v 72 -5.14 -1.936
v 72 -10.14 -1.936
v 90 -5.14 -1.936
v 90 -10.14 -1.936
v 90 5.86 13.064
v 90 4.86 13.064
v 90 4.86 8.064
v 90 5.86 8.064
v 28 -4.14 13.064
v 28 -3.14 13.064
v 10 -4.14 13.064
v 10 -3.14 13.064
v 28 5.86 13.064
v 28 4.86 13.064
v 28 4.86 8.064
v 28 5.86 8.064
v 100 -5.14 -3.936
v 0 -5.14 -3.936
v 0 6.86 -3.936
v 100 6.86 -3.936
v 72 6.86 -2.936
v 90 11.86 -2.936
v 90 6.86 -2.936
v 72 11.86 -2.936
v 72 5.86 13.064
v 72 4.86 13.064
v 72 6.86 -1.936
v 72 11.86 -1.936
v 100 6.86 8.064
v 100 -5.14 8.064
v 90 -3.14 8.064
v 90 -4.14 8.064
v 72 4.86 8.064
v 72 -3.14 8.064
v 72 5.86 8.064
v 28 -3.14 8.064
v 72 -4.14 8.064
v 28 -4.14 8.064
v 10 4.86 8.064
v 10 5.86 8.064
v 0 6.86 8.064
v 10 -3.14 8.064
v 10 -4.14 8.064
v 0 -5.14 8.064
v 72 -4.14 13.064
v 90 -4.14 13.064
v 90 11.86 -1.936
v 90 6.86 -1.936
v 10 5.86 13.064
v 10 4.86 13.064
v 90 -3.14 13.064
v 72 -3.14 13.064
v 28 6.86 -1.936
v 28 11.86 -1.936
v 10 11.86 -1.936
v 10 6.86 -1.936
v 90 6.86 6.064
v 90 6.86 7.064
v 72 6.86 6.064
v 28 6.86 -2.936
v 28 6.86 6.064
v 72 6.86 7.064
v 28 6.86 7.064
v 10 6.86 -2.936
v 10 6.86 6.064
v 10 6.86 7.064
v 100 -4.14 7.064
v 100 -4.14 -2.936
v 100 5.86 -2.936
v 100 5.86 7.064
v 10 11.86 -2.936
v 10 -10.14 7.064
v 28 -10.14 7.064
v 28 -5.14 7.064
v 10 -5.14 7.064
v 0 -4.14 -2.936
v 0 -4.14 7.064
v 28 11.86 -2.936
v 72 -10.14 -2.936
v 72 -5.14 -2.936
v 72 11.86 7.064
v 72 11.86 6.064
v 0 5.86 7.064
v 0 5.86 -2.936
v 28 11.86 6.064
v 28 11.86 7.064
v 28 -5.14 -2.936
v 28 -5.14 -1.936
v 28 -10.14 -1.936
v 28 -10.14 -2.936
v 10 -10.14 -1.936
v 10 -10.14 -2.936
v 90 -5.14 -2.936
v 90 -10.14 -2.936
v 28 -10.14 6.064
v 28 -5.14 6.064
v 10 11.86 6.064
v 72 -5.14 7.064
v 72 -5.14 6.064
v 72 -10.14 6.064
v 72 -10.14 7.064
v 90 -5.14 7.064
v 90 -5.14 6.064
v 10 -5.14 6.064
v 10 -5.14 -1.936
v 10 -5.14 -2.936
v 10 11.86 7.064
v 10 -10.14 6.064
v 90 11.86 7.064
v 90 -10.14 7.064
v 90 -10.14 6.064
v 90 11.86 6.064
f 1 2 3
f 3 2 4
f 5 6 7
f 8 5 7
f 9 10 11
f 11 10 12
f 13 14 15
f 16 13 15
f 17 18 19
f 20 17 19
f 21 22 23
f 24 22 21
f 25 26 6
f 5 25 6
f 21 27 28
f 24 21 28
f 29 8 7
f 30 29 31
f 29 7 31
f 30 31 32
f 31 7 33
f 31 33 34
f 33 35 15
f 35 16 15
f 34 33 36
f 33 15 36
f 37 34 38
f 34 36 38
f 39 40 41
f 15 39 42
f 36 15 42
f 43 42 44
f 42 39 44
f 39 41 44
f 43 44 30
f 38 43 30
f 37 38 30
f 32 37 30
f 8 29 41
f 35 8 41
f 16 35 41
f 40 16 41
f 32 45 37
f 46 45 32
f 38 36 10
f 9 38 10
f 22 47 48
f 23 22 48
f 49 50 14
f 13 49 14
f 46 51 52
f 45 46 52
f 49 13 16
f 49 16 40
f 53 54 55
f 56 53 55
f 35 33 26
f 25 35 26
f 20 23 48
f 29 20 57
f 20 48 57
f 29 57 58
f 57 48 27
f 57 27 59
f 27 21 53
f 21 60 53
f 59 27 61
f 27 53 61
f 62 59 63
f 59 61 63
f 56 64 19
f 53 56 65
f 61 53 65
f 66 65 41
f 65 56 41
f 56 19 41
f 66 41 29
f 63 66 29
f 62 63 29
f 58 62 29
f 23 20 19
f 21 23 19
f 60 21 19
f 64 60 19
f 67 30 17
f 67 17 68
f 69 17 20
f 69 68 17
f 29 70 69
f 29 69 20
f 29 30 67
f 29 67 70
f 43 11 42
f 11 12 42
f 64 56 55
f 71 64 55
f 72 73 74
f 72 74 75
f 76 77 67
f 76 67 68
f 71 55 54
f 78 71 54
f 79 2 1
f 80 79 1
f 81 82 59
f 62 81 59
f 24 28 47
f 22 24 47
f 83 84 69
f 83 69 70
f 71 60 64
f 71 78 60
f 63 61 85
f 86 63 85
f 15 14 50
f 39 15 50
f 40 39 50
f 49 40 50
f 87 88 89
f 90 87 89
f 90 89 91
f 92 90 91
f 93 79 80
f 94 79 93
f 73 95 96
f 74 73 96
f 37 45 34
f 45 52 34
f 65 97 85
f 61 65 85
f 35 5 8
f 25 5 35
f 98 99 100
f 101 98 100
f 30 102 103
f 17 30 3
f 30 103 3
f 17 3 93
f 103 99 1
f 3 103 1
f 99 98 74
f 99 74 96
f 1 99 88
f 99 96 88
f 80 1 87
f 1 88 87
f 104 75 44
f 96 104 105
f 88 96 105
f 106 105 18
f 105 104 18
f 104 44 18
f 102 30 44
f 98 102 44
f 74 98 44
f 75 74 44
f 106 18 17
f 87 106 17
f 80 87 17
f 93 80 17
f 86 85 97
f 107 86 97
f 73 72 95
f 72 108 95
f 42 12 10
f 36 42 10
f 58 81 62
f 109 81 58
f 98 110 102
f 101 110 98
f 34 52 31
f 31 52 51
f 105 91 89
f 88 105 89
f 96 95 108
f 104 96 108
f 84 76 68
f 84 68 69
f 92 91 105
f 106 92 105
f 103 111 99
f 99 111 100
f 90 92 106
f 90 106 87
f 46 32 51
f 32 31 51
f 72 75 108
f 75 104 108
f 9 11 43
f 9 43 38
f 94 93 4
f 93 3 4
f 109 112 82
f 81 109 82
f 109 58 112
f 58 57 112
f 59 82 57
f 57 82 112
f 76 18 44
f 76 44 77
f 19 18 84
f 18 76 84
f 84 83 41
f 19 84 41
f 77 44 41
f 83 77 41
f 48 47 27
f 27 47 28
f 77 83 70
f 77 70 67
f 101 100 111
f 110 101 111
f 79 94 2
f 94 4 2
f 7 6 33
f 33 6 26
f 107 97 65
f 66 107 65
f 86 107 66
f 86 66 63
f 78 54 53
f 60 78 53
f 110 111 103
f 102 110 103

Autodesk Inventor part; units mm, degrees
ref_plane "YZ Plane" through (0, 0, 0) normal (1, 0, 0) x (0, 1, 0)
ref_plane "XZ Plane" through (0, 0, 0) normal (0, 1, 0) x (-1, 0, 0)
sketch "Sketch1" plane through (0, 0, 0) normal (1, 0, 0) x (0, 1, 0)
  line L0 (5.8599, 7.0637) -> (-4.1401, 7.0637)
  line L1 (-4.1401, 7.0637) -> (-4.1401, -2.9363)
  line L2 (-4.1401, -2.9363) -> (5.8599, -2.9363)
  line L3 (5.8599, -2.9363) -> (5.8599, 7.0637)
  line L4 (6.8599, 8.0637) -> (-5.1401, 8.0637)
  line L5 (-5.1401, 8.0637) -> (-5.1401, -3.9363)
  line L6 (-5.1401, -3.9363) -> (6.8599, -3.9363)
  line L7 (6.8599, -3.9363) -> (6.8599, 8.0637)
  point P0 (0, 0)
  dimension "d0" = 10
  dimension "d1" = 10
  dimension "d2" = 12
  dimension "d3" = 12
  dimension "d4" = 1
  dimension "d6" = 1
extrude "Extrusion1" add sketch "Sketch1" along normal blind 100
ref_plane "Work Plane1" through (0, -5.1401, 2.0637) normal (0, 0, 1) x (1, 0, 0)
ref_plane "Work Plane2" through (0, 0.8599, 8.0637) normal (0, 1, 0) x (1, 0, 0)
ref_plane "Work Plane3" through (0, -5.1401, 6.0637) normal (0, 0, 1) x (1, 0, 0)
sketch "Sketch3" plane through (0, -5.1401, 6.0637) normal (0, 0, 1) x (1, 0, 0)
  line L0 (0, 12) -> (100, 12) projected
  line L1 (10, 12) -> (28, 12)
  line L2 (28, 12) -> (28, 17)
  line L3 (28, 17) -> (10, 17)
  line L4 (10, 17) -> (10, 12)
  line L5 (72, 12) -> (90, 12)
  line L6 (90, 12) -> (90, 17)
  line L7 (90, 17) -> (72, 17)
  line L8 (72, 17) -> (72, 12)
  line L9 (100, 12) -> (100, 0) projected
  line L10 (0, 12) -> (0, 0) projected
  line L11 (50, 21.2815) -> (50, -16.5994)
  point P0 (0, 5.1401)
  dimension "d10" = 18
  dimension "d11" = 18
  dimension "d12" = 100
  dimension "d13" = 50
  dimension "d15" = 10
  dimension "d16" = 10
  dimension "d17" = 5
extrude "Extrusion2" add sketch "Sketch3" along normal blind 1
mirror "Mirror1" about plane through (0, -5.1401, 2.0637) normal (0, 0, 1) of "Extrusion2"
mirror "Mirror2" about plane through (0, 0.8599, 8.0637) normal (0, 1, 0) of "Extrusion2", "Mirror1"
pattern_circular "Circular Pattern1" count 2 over 270 about axis through (0, 0.8599, 2.0637) along (-1, 0, 0) of "Extrusion2", "Mirror1"
equation "\"d1\" = d0"
equation "\"d3\" = d2"
equation "\"d11\" = d10"
equation "\"d13\" = 0.5 * d12"
equation "\"d15\" = 0.1 * d12"
equation "\"d16\" = d15"
properties part number "fuselage_tail_interface"
